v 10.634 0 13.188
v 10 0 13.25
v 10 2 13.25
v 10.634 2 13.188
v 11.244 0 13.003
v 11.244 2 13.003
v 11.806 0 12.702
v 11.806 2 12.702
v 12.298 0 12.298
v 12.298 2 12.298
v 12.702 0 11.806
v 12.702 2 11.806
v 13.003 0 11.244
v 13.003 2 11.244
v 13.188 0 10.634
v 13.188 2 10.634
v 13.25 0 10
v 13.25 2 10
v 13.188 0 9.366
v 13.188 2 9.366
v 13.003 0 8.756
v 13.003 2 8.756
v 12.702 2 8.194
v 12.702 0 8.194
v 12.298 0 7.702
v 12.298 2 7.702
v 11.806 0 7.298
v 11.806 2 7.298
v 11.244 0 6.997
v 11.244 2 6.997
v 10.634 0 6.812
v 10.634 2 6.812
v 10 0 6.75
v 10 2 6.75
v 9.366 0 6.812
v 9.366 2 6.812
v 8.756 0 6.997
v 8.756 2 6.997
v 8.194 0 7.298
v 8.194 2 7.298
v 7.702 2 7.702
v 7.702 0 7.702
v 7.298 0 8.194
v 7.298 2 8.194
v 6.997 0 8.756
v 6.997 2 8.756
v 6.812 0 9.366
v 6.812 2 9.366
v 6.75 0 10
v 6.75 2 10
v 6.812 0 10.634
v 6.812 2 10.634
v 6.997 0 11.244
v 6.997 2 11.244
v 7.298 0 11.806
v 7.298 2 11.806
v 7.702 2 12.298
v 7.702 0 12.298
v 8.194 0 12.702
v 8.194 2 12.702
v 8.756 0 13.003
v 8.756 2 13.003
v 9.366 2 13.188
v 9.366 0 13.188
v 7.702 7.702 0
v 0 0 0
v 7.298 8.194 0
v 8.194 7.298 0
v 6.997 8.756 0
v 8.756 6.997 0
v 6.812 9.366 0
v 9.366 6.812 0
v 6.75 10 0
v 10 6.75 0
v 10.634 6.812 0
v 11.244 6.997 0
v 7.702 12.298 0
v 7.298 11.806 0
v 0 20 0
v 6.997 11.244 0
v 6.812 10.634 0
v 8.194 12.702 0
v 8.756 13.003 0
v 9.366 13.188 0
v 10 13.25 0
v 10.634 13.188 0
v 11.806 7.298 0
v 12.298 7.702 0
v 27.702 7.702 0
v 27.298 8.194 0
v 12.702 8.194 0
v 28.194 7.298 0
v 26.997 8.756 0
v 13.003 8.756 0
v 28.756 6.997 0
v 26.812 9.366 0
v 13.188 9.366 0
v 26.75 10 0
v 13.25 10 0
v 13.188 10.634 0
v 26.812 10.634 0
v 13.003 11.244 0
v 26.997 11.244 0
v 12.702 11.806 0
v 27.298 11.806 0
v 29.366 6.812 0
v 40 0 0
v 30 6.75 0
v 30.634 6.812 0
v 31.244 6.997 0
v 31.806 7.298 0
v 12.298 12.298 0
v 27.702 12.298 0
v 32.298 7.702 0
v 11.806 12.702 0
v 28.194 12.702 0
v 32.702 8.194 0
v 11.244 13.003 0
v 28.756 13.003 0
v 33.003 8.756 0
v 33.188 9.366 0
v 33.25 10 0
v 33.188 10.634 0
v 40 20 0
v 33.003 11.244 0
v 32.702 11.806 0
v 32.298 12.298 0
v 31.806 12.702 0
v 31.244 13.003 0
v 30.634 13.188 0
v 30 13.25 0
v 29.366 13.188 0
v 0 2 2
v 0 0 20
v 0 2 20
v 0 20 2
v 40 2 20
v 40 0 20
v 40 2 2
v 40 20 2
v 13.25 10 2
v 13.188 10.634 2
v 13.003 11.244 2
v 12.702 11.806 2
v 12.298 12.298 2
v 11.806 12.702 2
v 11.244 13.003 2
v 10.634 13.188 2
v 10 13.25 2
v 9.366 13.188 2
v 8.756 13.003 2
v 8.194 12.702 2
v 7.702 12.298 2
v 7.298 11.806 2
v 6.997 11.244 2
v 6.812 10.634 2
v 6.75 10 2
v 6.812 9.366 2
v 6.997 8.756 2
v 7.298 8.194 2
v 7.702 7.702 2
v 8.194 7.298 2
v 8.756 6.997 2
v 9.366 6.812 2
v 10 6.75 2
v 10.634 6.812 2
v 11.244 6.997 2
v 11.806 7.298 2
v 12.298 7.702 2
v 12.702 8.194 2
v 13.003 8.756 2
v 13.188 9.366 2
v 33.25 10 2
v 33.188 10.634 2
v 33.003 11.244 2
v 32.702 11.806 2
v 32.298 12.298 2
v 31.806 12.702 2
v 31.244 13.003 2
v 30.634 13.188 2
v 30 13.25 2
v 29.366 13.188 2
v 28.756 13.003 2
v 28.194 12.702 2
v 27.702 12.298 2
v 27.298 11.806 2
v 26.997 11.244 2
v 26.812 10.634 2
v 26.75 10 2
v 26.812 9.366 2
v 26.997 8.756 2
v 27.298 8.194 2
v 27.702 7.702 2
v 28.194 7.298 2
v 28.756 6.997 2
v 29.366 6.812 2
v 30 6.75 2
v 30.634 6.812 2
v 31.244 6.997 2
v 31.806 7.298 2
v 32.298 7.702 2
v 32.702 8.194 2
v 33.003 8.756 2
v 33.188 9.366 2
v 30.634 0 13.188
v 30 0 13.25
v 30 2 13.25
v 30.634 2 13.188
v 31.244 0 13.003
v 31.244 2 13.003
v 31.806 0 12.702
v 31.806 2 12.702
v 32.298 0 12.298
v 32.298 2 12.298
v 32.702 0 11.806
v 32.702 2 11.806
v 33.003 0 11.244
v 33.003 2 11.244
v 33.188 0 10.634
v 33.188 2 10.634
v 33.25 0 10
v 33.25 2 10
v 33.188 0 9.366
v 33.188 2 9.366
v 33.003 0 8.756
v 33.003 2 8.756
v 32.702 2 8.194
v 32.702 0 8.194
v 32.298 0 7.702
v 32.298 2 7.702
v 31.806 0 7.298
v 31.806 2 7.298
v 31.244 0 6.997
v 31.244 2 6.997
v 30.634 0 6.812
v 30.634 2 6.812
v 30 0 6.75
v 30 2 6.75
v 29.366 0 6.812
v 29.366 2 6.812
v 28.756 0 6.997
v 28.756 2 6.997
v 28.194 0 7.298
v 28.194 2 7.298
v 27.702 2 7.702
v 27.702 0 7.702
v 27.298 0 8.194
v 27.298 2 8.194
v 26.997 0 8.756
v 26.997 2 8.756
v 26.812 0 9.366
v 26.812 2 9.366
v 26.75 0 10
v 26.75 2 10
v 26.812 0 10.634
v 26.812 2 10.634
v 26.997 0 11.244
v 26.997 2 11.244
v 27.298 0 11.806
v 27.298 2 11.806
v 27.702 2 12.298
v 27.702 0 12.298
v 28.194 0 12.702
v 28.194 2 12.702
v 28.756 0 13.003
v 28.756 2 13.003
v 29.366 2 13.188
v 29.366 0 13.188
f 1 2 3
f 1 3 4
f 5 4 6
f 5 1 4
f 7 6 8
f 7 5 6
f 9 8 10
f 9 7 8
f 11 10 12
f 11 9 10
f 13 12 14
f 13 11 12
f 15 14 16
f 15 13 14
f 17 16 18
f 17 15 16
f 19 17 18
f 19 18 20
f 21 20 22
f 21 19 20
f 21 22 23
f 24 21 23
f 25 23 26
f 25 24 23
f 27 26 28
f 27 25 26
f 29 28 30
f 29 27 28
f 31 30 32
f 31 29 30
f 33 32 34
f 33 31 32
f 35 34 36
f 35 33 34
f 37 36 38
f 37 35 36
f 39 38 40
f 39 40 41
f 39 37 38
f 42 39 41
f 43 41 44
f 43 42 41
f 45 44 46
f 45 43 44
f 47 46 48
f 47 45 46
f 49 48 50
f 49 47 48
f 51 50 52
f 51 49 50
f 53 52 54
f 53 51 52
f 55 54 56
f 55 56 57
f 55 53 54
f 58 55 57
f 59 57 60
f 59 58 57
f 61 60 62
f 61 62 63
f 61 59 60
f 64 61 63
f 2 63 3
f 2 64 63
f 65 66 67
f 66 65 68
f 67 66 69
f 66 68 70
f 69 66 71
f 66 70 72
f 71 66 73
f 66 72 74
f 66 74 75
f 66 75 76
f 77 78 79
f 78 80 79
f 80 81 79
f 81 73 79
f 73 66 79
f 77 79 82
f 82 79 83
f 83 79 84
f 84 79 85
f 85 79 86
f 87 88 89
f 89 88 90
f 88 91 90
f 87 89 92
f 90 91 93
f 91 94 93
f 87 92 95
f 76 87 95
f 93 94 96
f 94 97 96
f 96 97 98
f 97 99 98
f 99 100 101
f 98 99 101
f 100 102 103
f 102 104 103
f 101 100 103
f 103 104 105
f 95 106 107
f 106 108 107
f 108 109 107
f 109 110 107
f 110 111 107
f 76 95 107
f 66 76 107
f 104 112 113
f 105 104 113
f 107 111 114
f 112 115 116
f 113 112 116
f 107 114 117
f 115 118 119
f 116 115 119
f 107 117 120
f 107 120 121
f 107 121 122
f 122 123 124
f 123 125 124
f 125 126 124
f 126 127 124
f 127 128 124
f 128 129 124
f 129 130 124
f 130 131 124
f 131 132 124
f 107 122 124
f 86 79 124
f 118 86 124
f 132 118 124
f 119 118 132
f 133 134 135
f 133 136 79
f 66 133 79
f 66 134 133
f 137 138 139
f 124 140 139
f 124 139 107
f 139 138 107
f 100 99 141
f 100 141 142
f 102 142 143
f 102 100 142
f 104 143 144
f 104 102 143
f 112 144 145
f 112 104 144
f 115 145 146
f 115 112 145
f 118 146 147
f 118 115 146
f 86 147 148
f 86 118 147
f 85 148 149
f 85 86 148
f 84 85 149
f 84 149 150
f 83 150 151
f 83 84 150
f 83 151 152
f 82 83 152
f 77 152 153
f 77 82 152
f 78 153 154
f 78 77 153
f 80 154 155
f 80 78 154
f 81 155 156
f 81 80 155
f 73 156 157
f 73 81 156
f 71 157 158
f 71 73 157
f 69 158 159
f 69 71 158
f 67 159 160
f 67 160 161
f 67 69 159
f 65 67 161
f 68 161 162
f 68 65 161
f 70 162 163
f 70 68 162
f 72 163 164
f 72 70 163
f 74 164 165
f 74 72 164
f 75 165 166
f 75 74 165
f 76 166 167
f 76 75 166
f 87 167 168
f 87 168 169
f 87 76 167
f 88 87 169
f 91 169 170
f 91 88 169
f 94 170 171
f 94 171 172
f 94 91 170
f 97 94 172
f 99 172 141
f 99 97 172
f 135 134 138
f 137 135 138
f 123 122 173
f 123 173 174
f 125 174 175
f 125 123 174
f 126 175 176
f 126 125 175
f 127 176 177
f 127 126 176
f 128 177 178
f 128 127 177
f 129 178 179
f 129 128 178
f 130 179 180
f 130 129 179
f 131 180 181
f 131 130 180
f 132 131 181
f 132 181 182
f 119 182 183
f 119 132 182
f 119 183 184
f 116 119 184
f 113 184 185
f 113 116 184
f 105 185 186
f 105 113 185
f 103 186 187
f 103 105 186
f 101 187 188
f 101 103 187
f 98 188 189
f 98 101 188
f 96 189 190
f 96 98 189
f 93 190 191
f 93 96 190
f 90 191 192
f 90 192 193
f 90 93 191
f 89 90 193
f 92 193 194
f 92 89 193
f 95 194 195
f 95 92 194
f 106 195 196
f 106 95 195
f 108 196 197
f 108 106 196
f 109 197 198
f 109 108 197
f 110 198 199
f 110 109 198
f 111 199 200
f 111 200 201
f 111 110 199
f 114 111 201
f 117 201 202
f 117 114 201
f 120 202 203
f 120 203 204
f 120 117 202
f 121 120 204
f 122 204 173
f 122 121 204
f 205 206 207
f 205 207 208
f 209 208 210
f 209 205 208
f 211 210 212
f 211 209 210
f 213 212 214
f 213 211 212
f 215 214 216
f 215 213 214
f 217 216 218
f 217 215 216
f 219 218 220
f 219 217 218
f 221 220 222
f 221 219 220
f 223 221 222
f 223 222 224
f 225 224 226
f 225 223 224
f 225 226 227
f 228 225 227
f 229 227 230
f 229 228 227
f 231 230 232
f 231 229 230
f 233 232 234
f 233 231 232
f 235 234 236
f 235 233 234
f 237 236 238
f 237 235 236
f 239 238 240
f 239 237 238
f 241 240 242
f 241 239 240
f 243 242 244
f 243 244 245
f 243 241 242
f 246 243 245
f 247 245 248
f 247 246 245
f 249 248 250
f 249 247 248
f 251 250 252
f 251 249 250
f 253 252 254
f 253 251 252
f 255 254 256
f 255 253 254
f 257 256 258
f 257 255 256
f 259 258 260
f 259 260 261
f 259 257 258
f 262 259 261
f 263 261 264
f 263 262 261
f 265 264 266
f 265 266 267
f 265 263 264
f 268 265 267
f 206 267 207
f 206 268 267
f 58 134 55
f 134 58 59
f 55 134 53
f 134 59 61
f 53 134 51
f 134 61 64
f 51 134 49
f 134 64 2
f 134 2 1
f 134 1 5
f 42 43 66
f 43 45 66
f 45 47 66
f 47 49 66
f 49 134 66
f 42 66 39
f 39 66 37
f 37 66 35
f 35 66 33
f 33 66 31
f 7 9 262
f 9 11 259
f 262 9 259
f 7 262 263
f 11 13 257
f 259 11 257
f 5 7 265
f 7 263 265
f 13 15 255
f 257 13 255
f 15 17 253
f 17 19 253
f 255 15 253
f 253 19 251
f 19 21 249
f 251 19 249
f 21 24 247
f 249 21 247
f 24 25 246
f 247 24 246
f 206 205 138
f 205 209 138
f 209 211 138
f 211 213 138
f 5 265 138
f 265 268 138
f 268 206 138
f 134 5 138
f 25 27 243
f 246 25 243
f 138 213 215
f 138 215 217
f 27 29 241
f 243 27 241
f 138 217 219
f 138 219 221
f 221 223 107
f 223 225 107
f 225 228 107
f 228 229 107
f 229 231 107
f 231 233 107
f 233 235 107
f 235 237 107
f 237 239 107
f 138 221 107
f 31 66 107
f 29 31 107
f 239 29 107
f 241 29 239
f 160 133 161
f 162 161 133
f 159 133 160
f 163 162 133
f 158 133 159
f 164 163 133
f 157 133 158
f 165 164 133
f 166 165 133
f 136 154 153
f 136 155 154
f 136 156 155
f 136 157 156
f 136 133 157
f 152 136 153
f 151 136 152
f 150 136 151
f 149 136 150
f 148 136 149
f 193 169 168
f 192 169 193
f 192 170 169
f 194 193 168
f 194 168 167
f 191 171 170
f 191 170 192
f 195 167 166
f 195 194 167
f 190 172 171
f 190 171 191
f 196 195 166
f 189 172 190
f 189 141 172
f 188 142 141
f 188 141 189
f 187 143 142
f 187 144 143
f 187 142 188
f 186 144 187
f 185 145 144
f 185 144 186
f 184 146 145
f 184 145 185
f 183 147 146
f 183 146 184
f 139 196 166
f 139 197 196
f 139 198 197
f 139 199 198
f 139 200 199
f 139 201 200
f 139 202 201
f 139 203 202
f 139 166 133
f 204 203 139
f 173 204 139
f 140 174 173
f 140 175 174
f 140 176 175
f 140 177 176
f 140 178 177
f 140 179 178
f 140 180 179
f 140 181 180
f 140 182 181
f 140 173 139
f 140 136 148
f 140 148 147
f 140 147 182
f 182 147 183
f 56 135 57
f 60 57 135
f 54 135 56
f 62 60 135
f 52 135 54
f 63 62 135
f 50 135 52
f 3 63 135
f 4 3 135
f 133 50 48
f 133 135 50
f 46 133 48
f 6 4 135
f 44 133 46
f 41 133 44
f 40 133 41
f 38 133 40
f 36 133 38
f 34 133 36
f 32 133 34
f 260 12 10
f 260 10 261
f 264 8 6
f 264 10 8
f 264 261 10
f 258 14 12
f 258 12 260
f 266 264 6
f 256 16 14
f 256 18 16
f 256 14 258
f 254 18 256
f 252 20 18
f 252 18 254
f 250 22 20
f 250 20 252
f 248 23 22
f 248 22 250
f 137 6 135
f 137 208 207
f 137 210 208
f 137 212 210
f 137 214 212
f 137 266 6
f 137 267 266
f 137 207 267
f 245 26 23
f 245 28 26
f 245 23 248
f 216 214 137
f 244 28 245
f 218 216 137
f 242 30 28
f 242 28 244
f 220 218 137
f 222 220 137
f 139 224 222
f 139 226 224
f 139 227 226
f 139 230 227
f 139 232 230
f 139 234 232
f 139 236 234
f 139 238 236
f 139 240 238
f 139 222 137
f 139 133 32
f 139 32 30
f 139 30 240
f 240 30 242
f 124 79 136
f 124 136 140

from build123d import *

# Parameters (mm, degrees)
SKETCH1_W           = 40
SKETCH1_H           = 20
SKETCH1_R           = 3.25
BOSS_EXTRUDE1_DEPTH = 2
SKETCH3_W           = 40
SKETCH3_H           = 20
SKETCH3_R           = 3.25
BOSS_EXTRUDE2_DEPTH = 2


with BuildPart() as part:
    # Sketch1 → Boss-Extrude1 (new body)
    with BuildSketch(Plane.XY):
        with Locations((20, 10)):
            Rectangle(SKETCH1_W, SKETCH1_H)
        with Locations((10, 10)):
            Circle(SKETCH1_R, mode=Mode.SUBTRACT)
        with Locations((30, 10)):
            Circle(SKETCH1_R, mode=Mode.SUBTRACT)
    extrude(amount=BOSS_EXTRUDE1_DEPTH)

    # Sketch3 → Boss-Extrude2 (add)
    with BuildSketch(Plane(origin=(0, 0, 0), x_dir=(1, 0, 0), z_dir=(0, 1, 0))):
        with Locations((20, -10)):
            Rectangle(SKETCH3_W, SKETCH3_H)
        with Locations(Location((10, -10, 0), (0, 0, 270))):
            Circle(SKETCH3_R, mode=Mode.SUBTRACT)
        with Locations(Location((30, -10, 0), (0, 0, 270))):
            Circle(SKETCH3_R, mode=Mode.SUBTRACT)
    extrude(amount=BOSS_EXTRUDE2_DEPTH)


solid = part.part
